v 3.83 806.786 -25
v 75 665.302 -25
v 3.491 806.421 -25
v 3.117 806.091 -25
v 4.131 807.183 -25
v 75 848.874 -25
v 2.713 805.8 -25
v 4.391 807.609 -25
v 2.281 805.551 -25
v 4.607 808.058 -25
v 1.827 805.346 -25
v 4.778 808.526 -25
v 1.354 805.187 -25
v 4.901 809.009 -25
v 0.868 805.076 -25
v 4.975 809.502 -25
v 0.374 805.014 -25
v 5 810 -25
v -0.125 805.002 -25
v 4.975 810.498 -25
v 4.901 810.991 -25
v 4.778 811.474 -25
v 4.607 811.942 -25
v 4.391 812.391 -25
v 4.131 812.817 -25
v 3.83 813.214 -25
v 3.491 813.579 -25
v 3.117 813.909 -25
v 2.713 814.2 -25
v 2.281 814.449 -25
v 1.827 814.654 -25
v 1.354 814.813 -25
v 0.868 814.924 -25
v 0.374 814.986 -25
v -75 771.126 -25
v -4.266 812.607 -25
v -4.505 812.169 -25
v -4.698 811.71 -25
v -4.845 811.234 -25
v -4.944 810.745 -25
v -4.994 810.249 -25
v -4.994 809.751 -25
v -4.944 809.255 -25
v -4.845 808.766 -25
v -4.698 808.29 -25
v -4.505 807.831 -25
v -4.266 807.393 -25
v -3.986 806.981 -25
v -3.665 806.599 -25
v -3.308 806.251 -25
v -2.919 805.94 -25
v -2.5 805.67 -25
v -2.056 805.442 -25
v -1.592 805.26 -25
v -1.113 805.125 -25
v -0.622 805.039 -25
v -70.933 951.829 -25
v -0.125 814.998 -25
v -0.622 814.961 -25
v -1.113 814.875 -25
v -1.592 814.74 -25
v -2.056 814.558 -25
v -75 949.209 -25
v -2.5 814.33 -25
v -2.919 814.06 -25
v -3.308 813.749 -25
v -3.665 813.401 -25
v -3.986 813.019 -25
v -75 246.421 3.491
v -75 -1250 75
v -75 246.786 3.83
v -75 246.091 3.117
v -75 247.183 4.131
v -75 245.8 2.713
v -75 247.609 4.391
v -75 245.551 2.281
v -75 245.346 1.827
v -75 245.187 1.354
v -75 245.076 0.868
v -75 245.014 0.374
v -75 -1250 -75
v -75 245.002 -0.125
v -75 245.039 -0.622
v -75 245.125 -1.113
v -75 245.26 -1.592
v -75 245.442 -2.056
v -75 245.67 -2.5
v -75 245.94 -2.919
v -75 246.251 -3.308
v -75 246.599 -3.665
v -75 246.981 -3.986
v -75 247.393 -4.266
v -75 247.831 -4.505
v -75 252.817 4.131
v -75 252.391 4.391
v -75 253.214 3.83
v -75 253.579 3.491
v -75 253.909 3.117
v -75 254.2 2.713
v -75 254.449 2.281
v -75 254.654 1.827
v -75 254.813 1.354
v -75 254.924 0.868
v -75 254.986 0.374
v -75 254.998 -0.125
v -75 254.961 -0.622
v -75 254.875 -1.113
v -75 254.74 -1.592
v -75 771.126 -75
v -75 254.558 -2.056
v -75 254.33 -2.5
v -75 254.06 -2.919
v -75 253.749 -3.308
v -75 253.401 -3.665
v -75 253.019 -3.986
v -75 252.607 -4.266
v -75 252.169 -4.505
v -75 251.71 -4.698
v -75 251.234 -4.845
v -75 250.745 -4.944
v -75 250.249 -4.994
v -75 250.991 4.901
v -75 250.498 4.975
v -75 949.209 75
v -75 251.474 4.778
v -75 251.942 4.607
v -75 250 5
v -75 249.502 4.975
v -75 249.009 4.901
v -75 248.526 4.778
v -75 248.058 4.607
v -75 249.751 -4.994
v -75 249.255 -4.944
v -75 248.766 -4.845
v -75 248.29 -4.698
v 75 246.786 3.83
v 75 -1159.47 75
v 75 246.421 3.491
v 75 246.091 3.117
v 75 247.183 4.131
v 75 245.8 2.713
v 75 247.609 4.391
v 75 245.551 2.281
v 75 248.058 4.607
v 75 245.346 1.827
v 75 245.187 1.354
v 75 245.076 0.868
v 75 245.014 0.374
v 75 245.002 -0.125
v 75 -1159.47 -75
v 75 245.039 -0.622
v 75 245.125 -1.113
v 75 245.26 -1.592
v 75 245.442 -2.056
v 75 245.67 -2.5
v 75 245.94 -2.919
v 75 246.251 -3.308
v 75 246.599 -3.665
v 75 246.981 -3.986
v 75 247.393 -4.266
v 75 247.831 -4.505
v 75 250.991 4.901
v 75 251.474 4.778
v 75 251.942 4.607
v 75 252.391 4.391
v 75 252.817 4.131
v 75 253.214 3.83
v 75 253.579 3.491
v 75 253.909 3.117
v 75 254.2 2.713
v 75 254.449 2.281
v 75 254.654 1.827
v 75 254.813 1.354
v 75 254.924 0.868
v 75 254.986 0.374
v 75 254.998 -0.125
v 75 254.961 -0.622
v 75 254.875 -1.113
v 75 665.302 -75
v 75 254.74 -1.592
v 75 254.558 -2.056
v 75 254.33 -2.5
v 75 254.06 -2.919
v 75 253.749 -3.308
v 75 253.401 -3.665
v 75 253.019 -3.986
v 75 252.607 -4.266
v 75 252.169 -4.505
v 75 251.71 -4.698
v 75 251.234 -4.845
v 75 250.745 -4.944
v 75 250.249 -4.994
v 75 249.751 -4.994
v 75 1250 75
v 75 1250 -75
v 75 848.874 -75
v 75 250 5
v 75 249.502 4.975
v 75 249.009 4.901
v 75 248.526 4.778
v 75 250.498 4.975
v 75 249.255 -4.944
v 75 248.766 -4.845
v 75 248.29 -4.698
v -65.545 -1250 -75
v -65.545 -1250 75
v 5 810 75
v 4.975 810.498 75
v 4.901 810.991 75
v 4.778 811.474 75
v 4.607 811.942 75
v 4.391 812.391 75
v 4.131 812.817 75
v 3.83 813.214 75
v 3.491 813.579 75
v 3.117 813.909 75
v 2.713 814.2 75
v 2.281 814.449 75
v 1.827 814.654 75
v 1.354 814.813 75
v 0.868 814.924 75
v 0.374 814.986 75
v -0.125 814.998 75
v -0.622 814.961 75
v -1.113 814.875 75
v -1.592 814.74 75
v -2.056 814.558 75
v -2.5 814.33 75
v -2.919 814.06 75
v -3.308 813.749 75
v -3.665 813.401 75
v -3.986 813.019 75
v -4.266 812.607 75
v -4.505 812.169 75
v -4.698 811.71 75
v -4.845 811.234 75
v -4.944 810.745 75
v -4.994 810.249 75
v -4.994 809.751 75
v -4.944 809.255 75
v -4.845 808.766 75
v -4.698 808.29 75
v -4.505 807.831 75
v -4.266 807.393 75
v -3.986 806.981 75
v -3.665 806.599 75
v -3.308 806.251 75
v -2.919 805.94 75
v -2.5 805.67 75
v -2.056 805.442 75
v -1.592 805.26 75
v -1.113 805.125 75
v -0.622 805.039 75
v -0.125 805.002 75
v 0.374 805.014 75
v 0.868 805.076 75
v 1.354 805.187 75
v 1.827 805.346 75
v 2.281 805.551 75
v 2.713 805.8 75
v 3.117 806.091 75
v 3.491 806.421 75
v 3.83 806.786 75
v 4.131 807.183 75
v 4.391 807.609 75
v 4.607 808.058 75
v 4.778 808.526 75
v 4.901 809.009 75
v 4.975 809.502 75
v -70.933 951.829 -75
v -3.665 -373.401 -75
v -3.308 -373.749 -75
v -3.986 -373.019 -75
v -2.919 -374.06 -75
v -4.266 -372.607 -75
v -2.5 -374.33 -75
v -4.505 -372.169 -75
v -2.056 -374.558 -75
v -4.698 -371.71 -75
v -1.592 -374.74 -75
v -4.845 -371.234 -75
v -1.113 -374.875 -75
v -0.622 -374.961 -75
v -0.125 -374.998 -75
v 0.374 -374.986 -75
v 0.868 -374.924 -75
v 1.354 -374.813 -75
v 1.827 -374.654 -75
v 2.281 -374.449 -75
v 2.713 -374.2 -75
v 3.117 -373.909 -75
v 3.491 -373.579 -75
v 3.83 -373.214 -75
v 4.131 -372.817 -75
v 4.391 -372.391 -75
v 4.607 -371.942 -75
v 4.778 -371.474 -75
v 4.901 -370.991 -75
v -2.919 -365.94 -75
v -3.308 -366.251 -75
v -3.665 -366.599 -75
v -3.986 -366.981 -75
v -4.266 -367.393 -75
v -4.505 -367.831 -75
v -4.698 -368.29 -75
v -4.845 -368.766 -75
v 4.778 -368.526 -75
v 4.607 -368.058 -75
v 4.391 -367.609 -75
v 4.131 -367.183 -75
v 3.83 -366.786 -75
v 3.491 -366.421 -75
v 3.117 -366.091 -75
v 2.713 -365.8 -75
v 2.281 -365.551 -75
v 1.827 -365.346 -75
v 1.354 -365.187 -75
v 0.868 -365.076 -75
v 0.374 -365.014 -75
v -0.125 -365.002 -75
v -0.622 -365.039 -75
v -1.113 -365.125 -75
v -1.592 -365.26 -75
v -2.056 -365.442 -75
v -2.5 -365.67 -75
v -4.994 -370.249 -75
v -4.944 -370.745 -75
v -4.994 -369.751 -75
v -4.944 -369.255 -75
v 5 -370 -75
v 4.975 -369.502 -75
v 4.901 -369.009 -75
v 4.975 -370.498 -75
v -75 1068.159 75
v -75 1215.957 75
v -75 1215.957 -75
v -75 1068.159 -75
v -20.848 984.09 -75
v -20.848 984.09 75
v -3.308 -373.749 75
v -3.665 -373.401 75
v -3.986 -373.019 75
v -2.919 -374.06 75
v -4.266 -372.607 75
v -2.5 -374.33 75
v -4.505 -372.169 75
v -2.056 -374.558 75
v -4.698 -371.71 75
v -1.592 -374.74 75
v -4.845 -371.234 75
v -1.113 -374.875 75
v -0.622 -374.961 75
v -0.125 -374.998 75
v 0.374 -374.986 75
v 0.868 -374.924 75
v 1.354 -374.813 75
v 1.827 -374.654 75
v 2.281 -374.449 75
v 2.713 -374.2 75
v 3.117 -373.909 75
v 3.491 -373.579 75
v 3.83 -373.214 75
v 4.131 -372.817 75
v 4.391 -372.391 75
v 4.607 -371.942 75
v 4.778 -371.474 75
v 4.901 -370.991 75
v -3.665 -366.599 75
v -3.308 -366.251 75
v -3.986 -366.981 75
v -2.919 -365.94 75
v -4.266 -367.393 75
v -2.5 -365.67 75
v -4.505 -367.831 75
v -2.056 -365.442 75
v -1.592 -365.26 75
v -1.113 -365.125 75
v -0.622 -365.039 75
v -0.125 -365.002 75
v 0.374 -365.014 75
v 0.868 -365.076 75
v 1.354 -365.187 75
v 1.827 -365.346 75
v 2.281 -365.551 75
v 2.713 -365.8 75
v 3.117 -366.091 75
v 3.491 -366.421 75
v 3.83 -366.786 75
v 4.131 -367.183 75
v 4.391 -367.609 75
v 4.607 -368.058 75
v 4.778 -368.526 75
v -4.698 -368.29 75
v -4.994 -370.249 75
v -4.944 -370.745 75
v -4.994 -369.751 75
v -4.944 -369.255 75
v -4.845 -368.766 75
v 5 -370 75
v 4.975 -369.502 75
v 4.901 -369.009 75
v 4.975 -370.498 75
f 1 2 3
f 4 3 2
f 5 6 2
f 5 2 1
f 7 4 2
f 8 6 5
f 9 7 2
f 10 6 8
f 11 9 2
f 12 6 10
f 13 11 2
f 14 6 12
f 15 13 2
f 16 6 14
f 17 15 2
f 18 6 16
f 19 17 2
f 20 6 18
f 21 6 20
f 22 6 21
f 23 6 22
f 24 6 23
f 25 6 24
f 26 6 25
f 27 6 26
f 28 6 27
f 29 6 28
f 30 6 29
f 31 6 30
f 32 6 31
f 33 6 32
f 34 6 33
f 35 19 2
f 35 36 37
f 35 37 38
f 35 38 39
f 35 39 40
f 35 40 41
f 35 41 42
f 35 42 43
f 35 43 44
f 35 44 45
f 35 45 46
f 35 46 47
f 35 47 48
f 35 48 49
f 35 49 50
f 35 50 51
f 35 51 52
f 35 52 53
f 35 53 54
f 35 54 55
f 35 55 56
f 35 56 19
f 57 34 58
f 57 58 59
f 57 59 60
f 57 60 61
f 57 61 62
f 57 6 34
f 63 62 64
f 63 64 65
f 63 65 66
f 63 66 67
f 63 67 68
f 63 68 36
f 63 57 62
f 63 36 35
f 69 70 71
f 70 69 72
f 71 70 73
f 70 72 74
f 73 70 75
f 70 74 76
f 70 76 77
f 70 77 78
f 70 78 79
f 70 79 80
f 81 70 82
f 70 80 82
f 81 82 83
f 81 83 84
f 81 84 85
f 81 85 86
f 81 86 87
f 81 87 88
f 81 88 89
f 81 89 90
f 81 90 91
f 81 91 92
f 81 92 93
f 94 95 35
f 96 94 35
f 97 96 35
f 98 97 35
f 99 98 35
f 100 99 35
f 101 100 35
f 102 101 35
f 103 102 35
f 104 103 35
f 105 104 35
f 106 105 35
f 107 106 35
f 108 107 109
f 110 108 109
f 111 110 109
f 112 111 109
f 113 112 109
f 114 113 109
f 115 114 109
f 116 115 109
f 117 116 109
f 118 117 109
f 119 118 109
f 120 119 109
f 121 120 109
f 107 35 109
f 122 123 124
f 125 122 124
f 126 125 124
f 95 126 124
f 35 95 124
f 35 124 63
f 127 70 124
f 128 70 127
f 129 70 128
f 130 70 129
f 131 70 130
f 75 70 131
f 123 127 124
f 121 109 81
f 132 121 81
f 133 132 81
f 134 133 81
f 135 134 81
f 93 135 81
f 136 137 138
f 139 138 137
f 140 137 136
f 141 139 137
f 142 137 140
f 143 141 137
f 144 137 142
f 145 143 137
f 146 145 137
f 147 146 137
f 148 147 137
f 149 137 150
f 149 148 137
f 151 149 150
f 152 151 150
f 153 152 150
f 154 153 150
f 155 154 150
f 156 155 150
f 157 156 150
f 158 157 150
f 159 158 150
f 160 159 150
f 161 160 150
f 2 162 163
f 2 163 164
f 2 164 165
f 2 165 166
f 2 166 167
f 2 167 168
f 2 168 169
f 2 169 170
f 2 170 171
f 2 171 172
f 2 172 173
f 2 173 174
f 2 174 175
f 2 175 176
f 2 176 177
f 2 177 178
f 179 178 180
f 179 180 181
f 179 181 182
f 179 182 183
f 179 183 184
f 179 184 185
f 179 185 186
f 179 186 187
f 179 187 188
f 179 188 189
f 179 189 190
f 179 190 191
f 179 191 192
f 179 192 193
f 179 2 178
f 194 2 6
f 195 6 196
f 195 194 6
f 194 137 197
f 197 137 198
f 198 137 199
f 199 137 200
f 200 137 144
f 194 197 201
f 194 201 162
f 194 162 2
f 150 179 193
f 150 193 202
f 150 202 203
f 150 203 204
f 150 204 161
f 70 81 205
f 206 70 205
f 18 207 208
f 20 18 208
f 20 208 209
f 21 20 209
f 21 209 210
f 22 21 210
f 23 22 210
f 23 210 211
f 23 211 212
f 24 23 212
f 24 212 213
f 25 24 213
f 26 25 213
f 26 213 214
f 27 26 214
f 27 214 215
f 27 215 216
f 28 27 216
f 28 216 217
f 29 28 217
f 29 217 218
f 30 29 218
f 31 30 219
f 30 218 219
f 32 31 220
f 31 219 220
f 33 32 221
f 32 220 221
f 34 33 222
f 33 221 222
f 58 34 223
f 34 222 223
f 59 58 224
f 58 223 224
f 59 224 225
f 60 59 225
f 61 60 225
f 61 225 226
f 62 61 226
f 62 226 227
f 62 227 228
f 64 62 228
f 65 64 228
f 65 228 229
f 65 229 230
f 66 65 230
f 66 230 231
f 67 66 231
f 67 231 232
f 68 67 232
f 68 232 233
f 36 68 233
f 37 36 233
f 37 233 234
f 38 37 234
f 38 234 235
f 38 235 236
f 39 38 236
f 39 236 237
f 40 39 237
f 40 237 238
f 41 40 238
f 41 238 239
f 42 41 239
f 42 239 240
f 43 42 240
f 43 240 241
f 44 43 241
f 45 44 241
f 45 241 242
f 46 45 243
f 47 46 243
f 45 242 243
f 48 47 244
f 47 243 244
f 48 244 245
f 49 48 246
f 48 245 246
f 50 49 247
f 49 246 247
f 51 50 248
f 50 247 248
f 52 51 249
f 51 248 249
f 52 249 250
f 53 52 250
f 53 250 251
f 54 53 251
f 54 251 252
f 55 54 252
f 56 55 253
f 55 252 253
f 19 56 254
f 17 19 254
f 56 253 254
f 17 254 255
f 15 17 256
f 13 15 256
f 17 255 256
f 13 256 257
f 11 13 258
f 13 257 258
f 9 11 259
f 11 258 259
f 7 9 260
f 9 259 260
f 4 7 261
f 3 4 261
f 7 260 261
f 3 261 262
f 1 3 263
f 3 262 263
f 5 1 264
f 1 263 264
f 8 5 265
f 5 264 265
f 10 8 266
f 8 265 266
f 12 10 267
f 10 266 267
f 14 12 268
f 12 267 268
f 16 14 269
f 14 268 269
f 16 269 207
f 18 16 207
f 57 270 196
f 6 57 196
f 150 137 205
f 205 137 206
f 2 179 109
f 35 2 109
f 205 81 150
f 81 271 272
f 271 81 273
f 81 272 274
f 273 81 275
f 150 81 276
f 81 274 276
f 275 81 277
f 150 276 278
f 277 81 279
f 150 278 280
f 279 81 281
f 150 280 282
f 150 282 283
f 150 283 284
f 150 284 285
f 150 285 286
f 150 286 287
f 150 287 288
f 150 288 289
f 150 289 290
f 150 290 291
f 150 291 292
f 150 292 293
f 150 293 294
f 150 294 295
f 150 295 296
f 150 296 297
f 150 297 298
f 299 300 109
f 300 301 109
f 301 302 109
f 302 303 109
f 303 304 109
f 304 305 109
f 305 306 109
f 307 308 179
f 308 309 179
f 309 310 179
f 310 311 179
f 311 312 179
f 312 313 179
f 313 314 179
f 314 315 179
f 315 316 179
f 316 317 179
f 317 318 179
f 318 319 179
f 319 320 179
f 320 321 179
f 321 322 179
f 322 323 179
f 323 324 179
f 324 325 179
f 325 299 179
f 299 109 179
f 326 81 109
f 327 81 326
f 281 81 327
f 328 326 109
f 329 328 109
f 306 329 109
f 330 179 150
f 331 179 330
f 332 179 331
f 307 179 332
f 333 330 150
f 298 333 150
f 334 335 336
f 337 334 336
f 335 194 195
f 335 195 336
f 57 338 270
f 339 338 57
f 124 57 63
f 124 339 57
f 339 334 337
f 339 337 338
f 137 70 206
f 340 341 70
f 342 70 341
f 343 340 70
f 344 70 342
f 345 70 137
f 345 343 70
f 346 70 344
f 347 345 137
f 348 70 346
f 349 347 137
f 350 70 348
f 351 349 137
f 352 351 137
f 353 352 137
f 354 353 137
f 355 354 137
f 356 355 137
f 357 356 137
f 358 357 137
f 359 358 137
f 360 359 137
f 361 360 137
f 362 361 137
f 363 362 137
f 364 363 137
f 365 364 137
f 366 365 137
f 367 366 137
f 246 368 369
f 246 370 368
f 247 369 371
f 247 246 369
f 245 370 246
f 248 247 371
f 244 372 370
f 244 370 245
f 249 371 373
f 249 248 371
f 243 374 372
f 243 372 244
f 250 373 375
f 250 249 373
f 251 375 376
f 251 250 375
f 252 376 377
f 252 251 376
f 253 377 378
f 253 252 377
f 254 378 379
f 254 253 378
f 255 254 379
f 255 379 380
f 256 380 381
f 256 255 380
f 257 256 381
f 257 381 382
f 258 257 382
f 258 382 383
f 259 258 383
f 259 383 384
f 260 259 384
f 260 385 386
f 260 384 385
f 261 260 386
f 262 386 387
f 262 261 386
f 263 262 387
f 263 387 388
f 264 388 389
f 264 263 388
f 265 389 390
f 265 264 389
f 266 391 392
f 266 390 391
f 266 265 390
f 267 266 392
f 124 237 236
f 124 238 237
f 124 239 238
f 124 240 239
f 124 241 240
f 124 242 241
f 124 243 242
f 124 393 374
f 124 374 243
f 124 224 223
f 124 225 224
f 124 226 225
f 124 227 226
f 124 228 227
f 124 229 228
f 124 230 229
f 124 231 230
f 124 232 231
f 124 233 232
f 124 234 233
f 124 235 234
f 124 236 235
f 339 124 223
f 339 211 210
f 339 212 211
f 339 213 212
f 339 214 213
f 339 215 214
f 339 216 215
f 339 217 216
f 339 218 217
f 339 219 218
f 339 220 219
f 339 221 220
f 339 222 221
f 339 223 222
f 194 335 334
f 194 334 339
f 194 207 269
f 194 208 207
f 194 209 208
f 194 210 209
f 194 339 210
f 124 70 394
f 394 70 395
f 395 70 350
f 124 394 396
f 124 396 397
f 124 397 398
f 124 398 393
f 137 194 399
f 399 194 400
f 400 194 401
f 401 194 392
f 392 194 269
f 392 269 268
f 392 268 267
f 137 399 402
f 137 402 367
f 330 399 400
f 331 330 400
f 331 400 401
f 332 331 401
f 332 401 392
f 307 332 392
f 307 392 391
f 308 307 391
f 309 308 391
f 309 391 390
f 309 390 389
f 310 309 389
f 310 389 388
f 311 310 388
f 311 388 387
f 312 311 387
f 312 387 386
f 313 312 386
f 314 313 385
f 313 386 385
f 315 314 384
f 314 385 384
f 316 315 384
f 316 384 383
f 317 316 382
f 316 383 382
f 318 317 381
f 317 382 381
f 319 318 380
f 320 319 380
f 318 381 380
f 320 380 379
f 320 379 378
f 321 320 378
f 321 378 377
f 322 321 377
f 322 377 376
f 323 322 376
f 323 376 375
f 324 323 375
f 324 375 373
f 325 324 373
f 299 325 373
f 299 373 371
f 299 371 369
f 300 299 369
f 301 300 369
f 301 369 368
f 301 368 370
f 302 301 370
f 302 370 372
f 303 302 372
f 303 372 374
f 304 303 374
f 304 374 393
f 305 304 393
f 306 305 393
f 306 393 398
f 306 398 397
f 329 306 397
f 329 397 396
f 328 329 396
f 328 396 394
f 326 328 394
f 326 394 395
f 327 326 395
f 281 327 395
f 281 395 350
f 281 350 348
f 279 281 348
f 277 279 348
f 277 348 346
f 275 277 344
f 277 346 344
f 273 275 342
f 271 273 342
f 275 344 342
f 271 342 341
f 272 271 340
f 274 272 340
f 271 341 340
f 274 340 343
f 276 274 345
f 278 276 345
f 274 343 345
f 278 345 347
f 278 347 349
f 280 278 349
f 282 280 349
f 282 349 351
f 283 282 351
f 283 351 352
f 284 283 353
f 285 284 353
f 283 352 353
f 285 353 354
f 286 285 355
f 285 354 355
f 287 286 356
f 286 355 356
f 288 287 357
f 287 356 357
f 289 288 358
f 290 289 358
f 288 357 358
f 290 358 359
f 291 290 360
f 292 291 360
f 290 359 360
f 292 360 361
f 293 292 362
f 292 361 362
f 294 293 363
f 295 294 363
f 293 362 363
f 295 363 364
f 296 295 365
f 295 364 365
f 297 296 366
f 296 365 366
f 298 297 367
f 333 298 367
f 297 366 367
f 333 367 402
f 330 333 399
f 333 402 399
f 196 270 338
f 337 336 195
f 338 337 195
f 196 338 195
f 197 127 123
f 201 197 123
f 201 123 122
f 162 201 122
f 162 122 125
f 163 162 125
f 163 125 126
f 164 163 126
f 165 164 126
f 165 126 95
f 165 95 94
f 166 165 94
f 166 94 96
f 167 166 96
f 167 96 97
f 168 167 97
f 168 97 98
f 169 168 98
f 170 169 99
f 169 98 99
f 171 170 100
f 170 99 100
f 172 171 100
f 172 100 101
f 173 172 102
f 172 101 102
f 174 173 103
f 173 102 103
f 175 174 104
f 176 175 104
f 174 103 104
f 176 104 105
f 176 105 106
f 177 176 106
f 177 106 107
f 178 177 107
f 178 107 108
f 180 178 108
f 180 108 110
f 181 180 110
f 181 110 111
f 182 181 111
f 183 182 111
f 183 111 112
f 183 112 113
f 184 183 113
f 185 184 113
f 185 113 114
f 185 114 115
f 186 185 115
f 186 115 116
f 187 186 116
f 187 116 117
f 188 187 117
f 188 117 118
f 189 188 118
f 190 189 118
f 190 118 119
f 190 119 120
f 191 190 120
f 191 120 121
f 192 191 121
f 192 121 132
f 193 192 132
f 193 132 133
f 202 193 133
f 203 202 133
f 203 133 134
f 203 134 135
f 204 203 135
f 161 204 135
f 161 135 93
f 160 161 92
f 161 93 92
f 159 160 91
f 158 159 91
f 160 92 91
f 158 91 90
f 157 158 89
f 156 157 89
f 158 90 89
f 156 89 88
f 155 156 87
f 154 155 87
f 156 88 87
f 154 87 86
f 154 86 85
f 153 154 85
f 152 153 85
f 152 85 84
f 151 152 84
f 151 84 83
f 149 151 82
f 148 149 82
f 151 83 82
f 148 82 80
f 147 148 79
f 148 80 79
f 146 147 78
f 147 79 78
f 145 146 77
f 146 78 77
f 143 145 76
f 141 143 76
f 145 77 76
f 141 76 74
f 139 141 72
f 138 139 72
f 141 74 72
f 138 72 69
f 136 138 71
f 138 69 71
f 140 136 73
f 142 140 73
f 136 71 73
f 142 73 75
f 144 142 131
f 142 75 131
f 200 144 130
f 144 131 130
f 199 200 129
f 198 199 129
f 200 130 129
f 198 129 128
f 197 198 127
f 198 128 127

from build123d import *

# Parameters (mm, degrees)
SKETCH1_W           = 150
SKETCH1_H           = 150
BOSS_EXTRUDE1_DEPTH = 1250
SKETCH2_R           = 5
BOLTS_DEPTH         = 1262.199825563
TOPCUT_DEPTH        = 1262.199825563
ROOFCUT_DEPTH       = 1262.199825563
CUT_EXTRUDE4_DEPTH  = 1262.199825563
SKETCH6_R           = 5
CUT_EXTRUDE5_DEPTH  = 1262.199825563
CUT_EXTRUDE6_DEPTH  = 50


with BuildPart() as part:
    # Sketch1 → Boss-Extrude1 (new, symmetric)
    with BuildSketch(Plane(origin=(0, 0, 0), x_dir=(1, 0, 0), z_dir=(0, 1, 0))):
        Rectangle(SKETCH1_W, SKETCH1_H)
    extrude(amount=BOSS_EXTRUDE1_DEPTH, both=True)

    # Sketch2 → Bolts (cut, through all)
    with BuildSketch(Plane.XY.offset(75)):
        with Locations((0, 810)):
            Circle(SKETCH2_R)
        with Locations((0, -370)):
            Circle(SKETCH2_R)
    extrude(amount=-BOLTS_DEPTH, mode=Mode.SUBTRACT)

    # Sketch3 → TopCut (cut, through all)
    with BuildSketch(Plane.XY.offset(75)):
        Polygon((-75, 1068.159196847), (-20.84827249, 984.090234633), (-75, 949.20923319), align=None)
    extrude(amount=-TOPCUT_DEPTH, mode=Mode.SUBTRACT)

    # Sketch4 → RoofCut (cut, through all)
    with BuildSketch(Plane.XY.offset(75)):
        Polygon((75, 1250), (-75, 1215.956662981), (-75, 1250), align=None)
    extrude(amount=-ROOFCUT_DEPTH, mode=Mode.SUBTRACT)

    # Sketch5 → Cut-Extrude4 (cut, through all)
    with BuildSketch(Plane.XY.offset(75)):
        Polygon((75, -1159.47022319), (-65.544812434, -1250), (75, -1250), align=None)
    extrude(amount=-CUT_EXTRUDE4_DEPTH, mode=Mode.SUBTRACT)

    # Sketch6 → Cut-Extrude5 (cut, through all)
    with BuildSketch(Plane.ZY.offset(75)):
        with Locations((0, 250)):
            Circle(SKETCH6_R)
    extrude(amount=-CUT_EXTRUDE5_DEPTH, mode=Mode.SUBTRACT)

    # Sketch7 → Cut-Extrude6 (cut)
    with BuildSketch(Plane(origin=(0, 0, -75), x_dir=(-1, 0, 0), z_dir=(0, 0, -1))):
        Polygon((-75, 665.302341615), (75.500489844, 771.478930046), (75, 954.697658385), (-75, 848.874160527), align=None)
    extrude(amount=-CUT_EXTRUDE6_DEPTH, mode=Mode.SUBTRACT)


solid = part.part
